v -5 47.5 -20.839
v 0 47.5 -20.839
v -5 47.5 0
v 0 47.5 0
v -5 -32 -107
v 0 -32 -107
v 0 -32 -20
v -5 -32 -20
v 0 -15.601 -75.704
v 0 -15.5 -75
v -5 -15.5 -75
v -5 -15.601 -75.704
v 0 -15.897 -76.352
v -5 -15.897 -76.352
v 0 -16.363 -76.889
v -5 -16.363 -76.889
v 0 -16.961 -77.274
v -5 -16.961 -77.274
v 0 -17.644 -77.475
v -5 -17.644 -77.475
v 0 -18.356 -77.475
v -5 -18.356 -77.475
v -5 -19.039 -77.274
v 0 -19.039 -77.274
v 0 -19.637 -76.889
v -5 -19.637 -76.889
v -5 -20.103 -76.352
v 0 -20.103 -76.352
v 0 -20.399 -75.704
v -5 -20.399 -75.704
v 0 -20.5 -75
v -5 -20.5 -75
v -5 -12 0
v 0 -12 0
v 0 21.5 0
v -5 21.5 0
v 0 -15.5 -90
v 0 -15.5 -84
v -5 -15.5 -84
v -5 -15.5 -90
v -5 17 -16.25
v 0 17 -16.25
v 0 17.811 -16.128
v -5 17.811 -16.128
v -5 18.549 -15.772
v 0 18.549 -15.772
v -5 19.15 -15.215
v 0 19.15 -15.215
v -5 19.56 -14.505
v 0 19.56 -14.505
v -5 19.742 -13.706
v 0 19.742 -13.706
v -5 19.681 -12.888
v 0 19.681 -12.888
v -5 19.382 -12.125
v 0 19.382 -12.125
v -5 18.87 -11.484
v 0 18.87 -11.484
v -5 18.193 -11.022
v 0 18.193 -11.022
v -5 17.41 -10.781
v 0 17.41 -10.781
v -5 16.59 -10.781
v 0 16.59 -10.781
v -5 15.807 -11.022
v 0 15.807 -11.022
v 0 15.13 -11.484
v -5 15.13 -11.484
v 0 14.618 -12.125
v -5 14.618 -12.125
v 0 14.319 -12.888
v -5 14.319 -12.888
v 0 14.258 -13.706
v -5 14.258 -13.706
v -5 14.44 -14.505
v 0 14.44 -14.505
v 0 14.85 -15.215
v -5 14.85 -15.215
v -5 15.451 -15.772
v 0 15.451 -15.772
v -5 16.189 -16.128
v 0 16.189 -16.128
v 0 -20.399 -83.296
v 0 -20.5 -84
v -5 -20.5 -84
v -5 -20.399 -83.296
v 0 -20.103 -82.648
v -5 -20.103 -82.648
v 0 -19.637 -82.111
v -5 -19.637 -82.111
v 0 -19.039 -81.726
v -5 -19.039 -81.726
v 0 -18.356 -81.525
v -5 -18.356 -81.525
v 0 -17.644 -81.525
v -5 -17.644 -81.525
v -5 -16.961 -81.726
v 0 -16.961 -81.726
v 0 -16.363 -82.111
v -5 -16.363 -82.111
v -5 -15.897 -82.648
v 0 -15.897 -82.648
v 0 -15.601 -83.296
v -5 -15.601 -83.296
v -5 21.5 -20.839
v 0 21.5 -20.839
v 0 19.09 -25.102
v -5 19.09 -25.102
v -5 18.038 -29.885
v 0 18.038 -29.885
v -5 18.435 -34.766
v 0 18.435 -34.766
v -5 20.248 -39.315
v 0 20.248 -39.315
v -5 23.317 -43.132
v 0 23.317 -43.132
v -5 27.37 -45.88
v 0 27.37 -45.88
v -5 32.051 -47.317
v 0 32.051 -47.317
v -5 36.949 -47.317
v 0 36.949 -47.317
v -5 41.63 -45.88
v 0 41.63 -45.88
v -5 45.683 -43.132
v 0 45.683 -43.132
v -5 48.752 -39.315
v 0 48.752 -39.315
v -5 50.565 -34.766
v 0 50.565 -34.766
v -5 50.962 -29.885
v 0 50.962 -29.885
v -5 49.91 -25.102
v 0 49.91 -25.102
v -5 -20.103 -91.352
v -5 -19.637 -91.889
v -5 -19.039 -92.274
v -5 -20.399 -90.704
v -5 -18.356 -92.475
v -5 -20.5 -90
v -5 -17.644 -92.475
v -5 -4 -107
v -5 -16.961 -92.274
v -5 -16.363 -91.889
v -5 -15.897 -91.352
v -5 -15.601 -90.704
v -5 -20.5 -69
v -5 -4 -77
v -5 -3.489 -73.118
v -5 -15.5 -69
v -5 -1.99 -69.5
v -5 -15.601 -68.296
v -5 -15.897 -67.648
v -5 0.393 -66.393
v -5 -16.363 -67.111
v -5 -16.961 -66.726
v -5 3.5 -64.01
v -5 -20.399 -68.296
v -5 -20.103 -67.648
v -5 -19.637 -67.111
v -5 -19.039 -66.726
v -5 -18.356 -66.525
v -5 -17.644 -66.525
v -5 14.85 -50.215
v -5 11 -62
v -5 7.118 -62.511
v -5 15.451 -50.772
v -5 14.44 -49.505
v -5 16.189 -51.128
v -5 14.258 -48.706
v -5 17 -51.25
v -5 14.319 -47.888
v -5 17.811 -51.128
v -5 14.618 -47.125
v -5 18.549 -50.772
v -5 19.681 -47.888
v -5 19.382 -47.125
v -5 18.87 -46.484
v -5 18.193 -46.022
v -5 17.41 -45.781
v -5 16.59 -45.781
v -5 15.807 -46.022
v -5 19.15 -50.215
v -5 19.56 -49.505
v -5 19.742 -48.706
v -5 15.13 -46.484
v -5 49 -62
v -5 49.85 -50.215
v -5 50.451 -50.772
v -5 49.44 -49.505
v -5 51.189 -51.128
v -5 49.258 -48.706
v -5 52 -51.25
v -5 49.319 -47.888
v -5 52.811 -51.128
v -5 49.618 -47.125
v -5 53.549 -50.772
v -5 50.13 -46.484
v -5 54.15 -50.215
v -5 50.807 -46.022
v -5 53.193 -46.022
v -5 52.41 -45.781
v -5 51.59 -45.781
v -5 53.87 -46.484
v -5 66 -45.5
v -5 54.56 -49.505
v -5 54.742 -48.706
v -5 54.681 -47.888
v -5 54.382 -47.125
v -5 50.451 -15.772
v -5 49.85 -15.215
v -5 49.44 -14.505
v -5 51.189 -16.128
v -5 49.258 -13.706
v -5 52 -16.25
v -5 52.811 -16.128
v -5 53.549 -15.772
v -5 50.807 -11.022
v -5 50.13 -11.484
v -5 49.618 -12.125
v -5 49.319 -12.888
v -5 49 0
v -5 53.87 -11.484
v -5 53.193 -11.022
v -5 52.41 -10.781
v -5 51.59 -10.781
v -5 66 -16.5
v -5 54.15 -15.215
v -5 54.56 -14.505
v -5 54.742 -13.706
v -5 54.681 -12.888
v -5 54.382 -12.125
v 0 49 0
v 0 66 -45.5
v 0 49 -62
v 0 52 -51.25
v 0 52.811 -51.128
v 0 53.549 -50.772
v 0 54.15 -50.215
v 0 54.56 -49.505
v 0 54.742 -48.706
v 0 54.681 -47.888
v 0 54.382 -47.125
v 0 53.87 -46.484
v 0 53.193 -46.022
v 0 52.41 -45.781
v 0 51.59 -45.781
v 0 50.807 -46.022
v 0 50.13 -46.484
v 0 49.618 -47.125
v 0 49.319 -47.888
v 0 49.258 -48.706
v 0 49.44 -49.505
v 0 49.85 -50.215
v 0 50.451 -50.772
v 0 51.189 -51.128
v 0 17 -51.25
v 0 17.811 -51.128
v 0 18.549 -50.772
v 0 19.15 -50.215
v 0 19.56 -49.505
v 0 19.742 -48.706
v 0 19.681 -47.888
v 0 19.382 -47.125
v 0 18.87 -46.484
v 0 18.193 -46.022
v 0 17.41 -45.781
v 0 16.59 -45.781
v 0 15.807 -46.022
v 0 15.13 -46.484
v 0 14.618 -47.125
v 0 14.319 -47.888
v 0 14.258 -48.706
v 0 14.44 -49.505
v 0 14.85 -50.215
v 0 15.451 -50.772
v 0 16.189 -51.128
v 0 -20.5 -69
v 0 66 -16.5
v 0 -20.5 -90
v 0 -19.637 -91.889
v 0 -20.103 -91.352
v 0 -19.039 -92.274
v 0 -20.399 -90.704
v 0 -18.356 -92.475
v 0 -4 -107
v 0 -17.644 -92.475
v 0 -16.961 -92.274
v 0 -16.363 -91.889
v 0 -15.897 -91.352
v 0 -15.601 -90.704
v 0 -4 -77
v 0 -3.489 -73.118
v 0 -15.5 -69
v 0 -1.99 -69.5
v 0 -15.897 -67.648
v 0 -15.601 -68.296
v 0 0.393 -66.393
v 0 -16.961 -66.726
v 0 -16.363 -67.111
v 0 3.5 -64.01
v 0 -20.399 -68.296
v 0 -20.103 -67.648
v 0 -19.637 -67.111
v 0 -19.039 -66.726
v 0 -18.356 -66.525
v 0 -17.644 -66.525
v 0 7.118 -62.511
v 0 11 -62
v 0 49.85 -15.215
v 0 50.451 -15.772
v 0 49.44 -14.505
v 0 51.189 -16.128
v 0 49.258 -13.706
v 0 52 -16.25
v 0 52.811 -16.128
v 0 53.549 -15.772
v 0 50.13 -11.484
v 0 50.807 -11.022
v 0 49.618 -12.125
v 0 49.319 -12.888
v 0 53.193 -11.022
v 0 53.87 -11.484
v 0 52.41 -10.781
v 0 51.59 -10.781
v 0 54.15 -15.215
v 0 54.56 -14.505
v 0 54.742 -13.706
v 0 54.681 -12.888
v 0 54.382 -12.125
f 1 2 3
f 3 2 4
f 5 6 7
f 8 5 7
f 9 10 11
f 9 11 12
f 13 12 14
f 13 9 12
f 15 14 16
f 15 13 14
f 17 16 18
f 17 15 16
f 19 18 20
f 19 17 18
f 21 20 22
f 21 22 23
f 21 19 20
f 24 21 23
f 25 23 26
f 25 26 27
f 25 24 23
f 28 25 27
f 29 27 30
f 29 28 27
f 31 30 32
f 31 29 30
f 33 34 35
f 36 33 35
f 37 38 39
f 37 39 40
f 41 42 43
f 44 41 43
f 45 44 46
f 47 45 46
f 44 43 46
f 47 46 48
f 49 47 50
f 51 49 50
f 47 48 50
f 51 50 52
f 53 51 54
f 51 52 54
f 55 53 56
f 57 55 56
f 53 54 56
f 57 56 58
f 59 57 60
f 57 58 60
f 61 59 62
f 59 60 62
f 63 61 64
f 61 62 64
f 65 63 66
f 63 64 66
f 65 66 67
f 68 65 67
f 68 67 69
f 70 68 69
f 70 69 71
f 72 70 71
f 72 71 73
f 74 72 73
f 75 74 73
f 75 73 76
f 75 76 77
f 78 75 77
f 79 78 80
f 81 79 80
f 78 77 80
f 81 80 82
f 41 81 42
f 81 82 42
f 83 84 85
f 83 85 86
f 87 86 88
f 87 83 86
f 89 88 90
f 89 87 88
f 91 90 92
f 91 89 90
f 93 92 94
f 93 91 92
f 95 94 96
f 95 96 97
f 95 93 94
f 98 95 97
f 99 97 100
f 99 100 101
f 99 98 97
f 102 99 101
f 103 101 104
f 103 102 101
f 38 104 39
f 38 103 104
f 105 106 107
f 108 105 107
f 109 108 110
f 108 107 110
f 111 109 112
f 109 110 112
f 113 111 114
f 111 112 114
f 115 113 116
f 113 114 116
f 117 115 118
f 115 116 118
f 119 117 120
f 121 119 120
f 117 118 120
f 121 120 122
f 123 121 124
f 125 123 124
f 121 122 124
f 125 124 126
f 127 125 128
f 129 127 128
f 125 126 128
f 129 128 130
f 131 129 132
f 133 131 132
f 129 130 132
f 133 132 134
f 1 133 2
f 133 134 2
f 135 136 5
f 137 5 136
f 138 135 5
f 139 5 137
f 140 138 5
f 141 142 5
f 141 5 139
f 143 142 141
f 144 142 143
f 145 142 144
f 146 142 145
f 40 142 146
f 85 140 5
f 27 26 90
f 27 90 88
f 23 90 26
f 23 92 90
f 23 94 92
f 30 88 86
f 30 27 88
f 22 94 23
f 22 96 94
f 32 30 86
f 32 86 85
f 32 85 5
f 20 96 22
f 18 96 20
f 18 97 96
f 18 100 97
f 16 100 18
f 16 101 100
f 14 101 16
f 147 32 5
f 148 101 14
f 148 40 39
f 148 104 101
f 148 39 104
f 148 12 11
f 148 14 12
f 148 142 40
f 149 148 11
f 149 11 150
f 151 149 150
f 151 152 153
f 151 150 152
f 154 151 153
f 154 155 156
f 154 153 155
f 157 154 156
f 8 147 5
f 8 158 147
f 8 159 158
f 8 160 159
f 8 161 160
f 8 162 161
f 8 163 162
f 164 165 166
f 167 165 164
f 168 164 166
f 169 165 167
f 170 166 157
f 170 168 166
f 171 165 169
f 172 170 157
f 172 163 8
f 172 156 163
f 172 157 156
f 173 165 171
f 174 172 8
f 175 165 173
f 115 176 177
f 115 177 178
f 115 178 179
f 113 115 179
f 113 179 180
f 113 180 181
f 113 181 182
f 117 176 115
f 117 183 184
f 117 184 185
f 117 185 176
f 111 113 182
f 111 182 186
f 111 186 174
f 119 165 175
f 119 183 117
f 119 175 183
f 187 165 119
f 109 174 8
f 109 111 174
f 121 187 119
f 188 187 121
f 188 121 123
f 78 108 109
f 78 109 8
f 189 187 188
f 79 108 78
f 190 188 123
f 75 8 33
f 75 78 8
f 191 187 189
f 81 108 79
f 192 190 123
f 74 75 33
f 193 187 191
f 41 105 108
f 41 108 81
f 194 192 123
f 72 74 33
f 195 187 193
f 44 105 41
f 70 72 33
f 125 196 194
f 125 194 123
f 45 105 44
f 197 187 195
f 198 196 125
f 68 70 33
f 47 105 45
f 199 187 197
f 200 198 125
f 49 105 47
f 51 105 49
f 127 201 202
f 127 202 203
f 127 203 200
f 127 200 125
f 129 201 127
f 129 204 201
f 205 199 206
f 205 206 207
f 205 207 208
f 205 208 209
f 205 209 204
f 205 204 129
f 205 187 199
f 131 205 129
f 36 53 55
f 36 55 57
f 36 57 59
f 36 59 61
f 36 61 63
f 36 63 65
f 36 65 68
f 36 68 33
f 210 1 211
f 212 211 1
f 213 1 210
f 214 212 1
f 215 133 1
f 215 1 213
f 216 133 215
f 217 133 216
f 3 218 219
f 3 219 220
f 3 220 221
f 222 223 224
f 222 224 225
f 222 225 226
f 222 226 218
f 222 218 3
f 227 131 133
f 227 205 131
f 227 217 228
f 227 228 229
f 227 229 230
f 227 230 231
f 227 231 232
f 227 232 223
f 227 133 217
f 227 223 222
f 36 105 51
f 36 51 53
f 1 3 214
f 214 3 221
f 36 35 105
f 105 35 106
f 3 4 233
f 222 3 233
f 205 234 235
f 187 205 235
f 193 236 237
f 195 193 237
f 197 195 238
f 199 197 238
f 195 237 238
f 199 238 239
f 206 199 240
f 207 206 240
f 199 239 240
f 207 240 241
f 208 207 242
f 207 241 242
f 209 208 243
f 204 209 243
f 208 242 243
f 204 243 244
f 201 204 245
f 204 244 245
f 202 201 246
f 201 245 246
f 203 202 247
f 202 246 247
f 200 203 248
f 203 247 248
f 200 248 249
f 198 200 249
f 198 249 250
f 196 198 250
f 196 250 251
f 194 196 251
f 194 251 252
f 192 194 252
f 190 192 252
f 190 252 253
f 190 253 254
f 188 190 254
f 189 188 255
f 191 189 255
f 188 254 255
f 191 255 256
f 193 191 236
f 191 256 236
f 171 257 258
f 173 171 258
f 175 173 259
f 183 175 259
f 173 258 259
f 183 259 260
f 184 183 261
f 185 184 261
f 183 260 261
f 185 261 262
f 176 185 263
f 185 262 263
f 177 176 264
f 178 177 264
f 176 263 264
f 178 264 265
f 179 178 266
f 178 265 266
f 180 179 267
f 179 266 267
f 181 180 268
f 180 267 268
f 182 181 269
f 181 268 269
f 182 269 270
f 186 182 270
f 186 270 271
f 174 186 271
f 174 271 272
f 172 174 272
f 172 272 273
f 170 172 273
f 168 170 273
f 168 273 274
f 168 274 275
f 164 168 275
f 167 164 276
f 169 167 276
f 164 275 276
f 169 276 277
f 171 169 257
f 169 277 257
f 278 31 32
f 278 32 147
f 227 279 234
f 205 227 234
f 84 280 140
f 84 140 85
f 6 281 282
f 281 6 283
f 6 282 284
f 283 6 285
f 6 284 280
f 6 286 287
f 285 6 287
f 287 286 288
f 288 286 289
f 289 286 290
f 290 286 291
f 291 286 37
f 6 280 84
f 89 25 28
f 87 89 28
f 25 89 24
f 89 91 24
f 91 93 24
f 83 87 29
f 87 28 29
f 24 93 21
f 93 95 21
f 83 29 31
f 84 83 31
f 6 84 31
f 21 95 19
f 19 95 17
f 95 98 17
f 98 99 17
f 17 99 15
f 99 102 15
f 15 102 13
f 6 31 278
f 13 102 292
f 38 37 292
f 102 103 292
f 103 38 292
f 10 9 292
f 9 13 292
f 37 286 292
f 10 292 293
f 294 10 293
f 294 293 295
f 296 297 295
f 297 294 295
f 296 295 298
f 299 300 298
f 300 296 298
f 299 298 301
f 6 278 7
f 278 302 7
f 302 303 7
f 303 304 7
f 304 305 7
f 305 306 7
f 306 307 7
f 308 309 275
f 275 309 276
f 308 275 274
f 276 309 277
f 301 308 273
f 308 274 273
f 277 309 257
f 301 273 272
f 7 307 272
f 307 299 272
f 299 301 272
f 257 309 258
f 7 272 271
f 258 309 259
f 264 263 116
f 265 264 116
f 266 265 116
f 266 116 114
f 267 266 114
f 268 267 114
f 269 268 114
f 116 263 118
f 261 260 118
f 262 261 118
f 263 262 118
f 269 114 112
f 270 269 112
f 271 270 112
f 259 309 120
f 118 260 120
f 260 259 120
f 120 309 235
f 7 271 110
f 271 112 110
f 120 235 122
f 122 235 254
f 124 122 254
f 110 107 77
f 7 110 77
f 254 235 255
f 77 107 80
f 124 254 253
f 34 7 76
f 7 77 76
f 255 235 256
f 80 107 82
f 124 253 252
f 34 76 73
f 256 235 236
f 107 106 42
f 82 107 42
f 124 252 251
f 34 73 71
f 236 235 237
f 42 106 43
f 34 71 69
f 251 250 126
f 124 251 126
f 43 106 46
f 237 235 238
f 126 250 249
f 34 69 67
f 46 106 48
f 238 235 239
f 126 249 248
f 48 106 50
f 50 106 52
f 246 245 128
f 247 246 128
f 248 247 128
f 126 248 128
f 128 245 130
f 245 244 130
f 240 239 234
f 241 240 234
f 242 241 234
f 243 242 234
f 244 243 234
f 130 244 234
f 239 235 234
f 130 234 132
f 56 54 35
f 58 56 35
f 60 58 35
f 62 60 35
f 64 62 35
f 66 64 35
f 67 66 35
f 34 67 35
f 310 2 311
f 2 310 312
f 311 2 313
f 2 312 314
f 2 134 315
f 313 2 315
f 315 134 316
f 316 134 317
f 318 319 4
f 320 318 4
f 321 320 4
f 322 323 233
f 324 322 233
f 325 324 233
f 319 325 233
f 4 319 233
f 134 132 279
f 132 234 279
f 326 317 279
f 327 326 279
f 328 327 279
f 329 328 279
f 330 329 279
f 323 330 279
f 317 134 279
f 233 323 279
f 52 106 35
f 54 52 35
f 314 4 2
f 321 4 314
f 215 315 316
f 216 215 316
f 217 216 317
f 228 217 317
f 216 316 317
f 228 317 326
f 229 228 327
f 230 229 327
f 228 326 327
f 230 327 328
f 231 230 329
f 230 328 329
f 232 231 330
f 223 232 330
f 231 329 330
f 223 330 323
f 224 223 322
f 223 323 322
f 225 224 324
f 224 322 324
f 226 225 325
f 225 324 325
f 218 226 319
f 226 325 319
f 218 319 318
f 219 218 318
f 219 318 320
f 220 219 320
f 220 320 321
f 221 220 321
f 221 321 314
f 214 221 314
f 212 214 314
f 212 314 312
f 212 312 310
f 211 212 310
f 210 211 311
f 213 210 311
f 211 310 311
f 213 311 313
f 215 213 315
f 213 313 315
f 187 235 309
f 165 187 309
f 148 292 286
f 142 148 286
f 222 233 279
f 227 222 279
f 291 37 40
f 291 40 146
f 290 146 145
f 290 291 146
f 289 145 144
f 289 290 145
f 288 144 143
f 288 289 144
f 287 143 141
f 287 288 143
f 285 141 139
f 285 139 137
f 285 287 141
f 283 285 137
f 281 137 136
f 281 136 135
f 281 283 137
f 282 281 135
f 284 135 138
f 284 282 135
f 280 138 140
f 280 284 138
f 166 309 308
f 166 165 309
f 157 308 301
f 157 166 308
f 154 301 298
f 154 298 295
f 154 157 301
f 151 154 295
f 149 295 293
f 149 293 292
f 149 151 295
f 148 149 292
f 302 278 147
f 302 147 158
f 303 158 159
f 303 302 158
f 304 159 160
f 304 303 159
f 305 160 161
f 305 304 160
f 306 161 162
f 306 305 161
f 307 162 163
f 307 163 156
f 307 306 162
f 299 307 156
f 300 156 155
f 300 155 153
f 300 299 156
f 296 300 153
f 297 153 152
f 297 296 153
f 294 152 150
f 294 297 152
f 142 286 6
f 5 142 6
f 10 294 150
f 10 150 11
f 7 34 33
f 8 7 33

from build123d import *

# Parameters (mm, degrees)
ESBO_O2_R                      = 2.75
CORPO_DEPTH                    = 5
RAIO_DE_AL_VIO_DE_TENS_O_R15_R = 15
CHAMFER1_SIZE                  = 20


with BuildPart() as part:
    # Esboço2 → Corpo (new body)
    with BuildSketch(Plane(origin=(0, 0, 0), x_dir=(0, 0, -1), z_dir=(1, 0, 0))):
        with BuildLine():
            Line((0, 49), (16.5, 66))
            Line((16.5, 66), (45.5, 66))
            Line((45.5, 66), (62, 49))
            Line((62, 49), (62, 0))
            Line((62, 0), (62, -4))
            Line((62, -4), (107, -4))
            Line((107, -4), (107, -32))
            Line((107, -32), (0, -32))
            Line((0, -32), (0, 0))
            Line((0, 0), (0, 21.5))
            Line((0, 21.5), (20.838799284, 21.5))
            ThreePointArc((20.838799284, 21.5), (47.5, 34.5), (20.838799284, 47.5))
            Line((20.838799284, 47.5), (0, 47.5))
            Line((0, 47.5), (0, 49))
        make_face()
        with Locations((48.5, 52)):
            Circle(ESBO_O2_R, mode=Mode.SUBTRACT)
        with Locations((13.5, 52)):
            Circle(ESBO_O2_R, mode=Mode.SUBTRACT)
        with Locations((48.5, 17)):
            Circle(ESBO_O2_R, mode=Mode.SUBTRACT)
        with Locations((13.5, 17)):
            Circle(ESBO_O2_R, mode=Mode.SUBTRACT)
        with BuildLine():
            Line((69, -15.5), (75, -15.5))
            ThreePointArc((75, -15.5), (77.5, -18), (75, -20.5))
            Line((75, -20.5), (69, -20.5))
            ThreePointArc((69, -20.5), (66.5, -18), (69, -15.5))
        make_face(mode=Mode.SUBTRACT)
        with BuildLine():
            Line((84, -15.5), (90, -15.5))
            ThreePointArc((90, -15.5), (92.5, -18), (90, -20.5))
            Line((90, -20.5), (84, -20.5))
            ThreePointArc((84, -20.5), (81.5, -18), (84, -15.5))
        make_face(mode=Mode.SUBTRACT)
    extrude(amount=-CORPO_DEPTH)

    # Raio de Alívio de Tensão - R15
    raio_de_al_vio_de_tens_o_r15_edges = [part.edges().sort_by_distance(p)[0] for p in [
        (-2.5, -4, -62),
    ]]
    fillet(raio_de_al_vio_de_tens_o_r15_edges, radius=RAIO_DE_AL_VIO_DE_TENS_O_R15_R)

    # Chamfer1
    chamfer1_edges = [part.edges().sort_by_distance(p)[0] for p in [
        (-2.5, -32, 0),
    ]]
    chamfer(chamfer1_edges, length=CHAMFER1_SIZE)


solid = part.part
